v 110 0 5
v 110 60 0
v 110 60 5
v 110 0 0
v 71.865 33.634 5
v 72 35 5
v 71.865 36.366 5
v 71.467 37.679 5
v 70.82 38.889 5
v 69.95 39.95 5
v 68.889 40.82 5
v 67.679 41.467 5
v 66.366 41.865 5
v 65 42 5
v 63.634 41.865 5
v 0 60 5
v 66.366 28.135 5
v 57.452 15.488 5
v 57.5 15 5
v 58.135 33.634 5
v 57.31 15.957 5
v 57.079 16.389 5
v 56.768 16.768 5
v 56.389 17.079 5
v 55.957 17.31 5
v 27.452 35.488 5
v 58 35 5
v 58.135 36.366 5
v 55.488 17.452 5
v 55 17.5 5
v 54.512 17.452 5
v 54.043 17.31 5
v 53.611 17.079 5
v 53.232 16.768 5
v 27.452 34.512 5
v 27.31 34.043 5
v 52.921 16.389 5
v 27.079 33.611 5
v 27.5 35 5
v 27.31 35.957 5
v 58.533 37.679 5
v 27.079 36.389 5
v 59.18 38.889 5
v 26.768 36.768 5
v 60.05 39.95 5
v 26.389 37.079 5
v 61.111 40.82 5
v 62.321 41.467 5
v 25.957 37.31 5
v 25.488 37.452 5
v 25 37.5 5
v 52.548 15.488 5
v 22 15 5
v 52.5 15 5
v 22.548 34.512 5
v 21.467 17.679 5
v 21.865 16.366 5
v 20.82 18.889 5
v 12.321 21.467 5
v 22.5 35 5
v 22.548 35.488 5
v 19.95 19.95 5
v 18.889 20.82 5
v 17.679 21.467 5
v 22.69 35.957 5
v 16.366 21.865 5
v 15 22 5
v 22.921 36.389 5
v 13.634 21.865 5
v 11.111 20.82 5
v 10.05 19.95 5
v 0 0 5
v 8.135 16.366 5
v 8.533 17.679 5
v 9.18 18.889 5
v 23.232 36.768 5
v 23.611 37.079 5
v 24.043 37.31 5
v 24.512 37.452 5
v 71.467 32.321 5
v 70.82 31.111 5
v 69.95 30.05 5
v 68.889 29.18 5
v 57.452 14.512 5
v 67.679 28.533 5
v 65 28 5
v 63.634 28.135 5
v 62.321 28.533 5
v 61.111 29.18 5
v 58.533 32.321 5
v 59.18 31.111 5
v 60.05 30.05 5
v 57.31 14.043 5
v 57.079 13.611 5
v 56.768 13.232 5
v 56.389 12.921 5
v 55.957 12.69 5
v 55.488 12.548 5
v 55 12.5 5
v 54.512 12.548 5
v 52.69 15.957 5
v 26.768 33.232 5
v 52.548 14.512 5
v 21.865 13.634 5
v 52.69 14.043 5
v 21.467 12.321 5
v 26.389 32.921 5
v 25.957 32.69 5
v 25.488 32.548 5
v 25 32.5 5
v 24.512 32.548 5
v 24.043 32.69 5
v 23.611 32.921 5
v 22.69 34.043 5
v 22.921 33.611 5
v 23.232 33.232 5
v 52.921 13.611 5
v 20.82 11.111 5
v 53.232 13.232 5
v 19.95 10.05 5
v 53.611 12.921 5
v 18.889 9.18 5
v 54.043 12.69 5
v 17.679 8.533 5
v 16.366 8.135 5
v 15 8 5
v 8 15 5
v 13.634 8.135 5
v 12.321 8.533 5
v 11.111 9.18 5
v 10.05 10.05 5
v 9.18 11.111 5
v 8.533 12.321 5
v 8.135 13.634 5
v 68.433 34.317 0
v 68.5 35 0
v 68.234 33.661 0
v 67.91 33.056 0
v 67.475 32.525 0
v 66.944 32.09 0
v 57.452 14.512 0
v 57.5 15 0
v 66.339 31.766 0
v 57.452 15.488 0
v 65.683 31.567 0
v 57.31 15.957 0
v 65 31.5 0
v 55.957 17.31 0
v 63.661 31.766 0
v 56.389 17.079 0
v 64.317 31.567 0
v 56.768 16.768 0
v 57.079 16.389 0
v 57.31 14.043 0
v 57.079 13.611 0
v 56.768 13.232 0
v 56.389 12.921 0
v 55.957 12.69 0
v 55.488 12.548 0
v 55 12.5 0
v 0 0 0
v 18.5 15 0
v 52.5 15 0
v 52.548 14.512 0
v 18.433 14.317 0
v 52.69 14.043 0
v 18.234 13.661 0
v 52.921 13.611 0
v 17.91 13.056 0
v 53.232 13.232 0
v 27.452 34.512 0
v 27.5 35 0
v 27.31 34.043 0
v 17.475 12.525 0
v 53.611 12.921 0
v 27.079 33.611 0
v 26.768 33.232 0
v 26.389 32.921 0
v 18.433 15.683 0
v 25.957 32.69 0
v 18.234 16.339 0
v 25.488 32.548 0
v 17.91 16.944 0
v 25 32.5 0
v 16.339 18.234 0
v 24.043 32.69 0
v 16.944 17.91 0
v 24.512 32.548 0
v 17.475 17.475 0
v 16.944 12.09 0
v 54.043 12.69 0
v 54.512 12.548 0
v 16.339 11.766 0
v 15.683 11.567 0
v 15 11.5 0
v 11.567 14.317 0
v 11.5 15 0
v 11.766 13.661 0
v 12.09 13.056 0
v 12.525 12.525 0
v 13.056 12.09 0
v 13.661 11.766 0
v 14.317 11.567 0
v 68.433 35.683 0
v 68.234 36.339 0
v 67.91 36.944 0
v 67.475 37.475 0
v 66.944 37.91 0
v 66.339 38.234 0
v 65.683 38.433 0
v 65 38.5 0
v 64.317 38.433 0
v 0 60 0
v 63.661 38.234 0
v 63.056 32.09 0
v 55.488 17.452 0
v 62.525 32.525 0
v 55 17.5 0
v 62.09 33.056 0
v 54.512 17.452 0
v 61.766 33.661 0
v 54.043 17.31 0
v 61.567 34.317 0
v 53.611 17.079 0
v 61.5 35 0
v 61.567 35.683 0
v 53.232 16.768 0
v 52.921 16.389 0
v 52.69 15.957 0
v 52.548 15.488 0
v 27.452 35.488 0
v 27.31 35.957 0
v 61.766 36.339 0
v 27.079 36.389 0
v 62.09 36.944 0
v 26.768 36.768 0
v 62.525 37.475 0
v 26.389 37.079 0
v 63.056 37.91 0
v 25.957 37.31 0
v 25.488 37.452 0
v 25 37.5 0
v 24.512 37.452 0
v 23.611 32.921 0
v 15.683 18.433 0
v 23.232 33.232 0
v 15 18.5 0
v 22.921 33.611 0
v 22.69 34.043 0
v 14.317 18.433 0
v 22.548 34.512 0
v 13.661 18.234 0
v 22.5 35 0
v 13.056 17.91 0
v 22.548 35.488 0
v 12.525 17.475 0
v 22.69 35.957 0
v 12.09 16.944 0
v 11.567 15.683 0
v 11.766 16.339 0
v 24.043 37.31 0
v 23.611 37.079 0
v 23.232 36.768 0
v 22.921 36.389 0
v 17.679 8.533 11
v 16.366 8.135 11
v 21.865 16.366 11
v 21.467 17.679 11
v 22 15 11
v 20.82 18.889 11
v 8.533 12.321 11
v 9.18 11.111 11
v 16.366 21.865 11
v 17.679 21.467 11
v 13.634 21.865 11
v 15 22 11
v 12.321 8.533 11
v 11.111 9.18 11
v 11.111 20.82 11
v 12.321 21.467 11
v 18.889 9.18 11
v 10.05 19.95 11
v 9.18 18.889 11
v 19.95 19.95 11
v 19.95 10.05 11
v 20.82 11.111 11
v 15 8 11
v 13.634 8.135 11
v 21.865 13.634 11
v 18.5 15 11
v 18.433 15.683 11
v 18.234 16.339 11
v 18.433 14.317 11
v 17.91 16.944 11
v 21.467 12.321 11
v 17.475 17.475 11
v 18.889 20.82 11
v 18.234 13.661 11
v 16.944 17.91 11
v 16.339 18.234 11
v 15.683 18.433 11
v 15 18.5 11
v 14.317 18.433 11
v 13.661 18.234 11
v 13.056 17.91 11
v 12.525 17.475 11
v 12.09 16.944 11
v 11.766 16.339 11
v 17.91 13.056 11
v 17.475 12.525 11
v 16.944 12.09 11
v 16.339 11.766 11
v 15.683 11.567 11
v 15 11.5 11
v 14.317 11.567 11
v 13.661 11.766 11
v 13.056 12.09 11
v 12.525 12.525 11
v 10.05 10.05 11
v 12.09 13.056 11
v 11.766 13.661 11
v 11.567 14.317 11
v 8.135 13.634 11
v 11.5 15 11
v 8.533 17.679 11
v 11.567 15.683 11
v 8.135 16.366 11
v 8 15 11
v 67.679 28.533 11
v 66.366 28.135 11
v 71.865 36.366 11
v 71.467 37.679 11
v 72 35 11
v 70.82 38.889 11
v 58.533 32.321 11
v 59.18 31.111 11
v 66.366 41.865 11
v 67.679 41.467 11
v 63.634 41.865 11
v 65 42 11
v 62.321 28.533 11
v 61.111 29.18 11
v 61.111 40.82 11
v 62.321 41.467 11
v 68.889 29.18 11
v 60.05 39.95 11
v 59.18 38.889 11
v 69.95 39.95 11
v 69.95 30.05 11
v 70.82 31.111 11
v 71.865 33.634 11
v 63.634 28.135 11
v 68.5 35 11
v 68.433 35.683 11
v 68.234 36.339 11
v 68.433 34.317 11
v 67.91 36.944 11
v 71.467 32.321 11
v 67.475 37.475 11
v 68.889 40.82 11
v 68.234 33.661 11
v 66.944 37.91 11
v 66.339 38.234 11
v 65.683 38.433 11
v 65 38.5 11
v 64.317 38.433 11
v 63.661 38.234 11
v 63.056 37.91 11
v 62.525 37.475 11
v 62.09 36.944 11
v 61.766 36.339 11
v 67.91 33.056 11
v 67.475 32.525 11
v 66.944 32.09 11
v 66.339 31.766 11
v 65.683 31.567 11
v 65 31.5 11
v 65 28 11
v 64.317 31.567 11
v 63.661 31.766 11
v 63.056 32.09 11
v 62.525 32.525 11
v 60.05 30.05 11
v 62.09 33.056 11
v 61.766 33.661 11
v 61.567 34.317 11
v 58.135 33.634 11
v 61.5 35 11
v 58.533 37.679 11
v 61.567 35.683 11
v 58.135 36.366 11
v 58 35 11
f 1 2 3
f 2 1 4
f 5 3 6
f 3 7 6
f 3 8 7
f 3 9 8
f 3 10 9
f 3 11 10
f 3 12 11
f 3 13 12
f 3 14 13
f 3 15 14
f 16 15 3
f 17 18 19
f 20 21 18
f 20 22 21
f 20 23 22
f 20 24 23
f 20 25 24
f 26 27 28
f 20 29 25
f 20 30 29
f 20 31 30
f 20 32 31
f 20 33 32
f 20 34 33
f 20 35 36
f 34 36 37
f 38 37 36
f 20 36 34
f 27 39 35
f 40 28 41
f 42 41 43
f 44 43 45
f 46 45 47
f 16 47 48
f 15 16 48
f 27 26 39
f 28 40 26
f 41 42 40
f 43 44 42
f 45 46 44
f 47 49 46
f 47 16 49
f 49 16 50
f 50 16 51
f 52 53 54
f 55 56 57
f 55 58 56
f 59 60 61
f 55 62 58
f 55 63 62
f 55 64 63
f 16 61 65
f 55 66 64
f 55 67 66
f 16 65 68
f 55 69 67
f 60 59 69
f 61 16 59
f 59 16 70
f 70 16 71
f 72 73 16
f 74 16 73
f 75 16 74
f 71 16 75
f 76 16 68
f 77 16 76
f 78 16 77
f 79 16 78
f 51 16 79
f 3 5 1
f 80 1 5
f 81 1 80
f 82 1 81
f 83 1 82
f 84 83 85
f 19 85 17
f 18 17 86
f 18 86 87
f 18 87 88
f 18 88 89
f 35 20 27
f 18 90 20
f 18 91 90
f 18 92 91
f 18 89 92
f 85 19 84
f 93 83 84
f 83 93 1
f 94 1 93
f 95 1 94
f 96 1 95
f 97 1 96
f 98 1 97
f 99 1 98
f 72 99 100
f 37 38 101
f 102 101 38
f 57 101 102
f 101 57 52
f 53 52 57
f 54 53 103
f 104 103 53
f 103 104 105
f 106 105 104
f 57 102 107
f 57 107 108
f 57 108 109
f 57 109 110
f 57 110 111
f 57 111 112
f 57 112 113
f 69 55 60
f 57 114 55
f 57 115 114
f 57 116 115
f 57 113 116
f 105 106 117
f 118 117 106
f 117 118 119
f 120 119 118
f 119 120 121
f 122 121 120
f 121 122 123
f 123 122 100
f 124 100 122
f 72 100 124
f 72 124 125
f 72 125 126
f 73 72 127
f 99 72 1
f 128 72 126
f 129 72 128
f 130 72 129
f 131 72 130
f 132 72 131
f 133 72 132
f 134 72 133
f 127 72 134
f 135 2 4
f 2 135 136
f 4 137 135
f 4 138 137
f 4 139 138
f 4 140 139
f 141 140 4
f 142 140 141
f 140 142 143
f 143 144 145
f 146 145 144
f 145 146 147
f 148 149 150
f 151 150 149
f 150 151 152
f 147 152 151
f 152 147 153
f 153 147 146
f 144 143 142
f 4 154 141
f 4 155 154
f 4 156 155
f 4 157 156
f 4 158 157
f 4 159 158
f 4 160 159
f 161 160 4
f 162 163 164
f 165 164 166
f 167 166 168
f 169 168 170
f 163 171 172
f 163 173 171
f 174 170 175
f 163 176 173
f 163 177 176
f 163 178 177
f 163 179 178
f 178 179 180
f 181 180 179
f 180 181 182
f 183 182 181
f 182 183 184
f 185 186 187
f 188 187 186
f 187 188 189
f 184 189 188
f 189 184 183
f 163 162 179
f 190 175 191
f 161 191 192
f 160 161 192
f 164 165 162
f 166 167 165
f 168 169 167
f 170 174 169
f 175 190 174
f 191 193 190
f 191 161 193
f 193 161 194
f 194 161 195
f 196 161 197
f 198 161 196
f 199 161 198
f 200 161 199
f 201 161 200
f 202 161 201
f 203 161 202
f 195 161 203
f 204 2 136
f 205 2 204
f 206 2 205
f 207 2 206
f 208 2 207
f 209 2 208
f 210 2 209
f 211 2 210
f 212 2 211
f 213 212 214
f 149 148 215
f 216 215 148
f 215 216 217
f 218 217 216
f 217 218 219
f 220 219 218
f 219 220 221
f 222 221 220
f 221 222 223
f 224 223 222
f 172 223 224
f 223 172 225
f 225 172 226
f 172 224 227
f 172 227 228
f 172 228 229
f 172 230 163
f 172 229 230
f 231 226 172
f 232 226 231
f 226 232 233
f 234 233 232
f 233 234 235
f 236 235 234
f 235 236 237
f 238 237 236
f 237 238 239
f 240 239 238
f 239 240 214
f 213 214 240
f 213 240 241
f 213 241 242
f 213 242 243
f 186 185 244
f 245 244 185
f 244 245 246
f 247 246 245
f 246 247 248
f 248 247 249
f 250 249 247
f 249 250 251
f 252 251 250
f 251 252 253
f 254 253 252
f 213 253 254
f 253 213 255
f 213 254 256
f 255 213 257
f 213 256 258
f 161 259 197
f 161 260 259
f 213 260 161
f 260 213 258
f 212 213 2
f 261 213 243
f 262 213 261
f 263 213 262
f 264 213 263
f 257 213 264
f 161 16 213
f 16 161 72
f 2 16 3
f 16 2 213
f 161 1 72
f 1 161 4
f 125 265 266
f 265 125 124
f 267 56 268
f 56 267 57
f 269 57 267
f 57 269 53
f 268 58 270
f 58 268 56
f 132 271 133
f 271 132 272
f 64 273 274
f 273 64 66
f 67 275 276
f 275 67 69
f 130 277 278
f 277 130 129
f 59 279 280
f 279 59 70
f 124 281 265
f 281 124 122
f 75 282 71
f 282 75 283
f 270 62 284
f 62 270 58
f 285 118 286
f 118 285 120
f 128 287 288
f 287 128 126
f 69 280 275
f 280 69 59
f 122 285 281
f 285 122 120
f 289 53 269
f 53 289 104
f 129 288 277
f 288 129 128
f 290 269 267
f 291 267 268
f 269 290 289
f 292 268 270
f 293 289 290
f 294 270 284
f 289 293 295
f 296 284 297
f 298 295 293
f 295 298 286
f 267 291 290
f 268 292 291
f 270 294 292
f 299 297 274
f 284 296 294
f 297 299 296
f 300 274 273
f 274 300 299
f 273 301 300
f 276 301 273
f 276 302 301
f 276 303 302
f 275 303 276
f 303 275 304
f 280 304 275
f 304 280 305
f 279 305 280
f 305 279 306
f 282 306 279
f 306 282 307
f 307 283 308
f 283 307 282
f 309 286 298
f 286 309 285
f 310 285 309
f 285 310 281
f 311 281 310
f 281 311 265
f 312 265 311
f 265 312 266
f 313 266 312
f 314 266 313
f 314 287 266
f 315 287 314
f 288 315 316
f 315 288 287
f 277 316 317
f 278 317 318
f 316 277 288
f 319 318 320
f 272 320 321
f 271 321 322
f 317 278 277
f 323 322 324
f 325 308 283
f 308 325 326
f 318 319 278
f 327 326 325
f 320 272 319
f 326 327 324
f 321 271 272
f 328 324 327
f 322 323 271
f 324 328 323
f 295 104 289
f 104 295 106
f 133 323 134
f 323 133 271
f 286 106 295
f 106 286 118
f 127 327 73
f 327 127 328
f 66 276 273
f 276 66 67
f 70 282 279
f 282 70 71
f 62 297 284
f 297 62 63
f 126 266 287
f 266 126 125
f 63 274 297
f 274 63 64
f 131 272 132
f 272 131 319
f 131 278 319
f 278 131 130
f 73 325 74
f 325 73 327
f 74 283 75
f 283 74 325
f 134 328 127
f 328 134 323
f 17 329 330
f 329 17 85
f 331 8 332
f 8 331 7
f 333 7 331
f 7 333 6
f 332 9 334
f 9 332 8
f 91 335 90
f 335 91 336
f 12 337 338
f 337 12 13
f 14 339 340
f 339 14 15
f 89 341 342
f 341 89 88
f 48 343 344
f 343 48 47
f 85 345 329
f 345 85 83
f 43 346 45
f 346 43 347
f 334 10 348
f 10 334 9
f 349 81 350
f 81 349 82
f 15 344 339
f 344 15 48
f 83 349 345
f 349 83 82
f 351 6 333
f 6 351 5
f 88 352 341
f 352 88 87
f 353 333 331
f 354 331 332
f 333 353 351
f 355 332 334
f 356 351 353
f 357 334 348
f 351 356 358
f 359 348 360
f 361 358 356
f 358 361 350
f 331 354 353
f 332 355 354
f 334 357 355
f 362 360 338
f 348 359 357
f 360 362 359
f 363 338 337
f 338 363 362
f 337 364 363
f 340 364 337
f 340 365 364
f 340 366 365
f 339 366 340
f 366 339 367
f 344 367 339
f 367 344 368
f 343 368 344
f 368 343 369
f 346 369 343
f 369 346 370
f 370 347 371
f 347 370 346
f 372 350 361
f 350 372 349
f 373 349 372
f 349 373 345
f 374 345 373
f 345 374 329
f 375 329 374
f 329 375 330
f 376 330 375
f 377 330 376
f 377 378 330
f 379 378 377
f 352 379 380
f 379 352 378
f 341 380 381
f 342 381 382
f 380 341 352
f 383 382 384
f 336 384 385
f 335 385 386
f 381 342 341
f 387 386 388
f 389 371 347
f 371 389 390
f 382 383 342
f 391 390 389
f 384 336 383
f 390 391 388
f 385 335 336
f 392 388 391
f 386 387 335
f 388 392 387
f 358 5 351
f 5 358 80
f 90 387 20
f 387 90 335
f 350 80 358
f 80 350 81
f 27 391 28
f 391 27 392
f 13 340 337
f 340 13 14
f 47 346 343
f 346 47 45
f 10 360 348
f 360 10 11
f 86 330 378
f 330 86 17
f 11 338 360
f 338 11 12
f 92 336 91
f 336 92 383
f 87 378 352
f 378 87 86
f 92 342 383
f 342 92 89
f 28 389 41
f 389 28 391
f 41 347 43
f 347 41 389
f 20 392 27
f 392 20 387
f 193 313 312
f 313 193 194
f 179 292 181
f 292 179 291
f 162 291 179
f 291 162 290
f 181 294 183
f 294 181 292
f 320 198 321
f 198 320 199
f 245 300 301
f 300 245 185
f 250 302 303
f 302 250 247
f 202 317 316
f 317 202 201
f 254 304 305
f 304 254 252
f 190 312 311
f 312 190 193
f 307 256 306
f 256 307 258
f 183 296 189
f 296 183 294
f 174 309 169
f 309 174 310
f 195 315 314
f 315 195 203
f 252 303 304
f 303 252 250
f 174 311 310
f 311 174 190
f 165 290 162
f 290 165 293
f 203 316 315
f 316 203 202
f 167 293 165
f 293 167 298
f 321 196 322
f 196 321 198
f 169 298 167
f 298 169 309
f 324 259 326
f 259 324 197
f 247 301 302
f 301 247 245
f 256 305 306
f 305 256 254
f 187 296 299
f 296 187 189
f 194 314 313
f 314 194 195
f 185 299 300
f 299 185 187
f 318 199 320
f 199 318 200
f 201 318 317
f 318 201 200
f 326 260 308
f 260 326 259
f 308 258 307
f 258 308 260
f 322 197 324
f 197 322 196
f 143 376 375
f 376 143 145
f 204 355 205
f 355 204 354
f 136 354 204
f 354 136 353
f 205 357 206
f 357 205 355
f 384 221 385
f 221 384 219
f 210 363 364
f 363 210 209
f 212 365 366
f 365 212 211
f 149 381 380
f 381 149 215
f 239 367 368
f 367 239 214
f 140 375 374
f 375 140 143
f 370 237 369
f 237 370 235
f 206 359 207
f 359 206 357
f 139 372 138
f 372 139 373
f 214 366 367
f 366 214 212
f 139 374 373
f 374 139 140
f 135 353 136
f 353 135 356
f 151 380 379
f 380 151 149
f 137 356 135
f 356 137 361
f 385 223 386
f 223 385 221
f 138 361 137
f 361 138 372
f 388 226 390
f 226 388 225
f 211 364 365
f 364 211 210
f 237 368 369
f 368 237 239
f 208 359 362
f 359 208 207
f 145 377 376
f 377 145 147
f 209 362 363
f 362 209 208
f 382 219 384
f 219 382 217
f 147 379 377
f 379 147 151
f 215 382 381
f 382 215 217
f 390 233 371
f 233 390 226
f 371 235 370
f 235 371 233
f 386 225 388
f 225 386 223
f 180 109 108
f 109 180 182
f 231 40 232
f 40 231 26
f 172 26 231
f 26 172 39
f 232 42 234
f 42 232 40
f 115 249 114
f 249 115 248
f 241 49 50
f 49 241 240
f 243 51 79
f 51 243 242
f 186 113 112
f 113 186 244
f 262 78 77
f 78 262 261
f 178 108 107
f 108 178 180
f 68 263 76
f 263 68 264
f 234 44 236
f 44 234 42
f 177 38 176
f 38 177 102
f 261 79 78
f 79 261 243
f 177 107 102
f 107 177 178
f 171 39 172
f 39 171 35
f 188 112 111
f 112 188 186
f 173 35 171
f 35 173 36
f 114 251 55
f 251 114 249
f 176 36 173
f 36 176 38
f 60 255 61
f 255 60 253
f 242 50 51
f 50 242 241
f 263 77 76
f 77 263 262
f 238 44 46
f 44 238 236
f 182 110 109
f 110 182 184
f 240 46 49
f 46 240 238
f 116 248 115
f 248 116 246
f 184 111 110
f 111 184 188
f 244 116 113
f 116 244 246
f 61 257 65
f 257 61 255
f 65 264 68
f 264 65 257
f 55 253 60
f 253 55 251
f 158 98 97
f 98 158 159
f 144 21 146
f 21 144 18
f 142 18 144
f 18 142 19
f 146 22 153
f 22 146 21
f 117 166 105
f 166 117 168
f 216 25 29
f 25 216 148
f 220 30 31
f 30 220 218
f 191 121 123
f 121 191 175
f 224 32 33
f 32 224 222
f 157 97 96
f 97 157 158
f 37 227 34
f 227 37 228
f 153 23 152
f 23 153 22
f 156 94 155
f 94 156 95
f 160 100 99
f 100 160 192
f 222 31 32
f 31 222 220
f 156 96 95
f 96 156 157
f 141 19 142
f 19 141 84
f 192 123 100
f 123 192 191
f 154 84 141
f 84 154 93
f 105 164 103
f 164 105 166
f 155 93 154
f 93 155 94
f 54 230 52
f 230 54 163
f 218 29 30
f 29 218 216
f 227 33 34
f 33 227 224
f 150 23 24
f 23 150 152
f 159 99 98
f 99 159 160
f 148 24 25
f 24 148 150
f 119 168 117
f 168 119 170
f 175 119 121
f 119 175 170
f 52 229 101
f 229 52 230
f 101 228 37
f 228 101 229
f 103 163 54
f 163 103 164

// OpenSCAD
$fn = 32;

// ----------------------------------------------------------------------
// Mixed field: bosses and holes at given coordinates
// ----------------------------------------------------------------------

// --- parameters (mm) ---
plate_l = 110;            // plate length, X
plate_w = 60;             // plate width, Y
plate_t = 5;              // plate thickness, Z
boss_d = 14;              // boss diameter
boss_h = 6;               // boss height above the plate
hole_d = 5;               // through hole diameter

total_h = plate_t + boss_h;  // overall height

difference() {
  union() {
    cube([plate_l, plate_w, plate_t]);
    translate([15, 15, plate_t]) cylinder(h = boss_h, d = boss_d);
    translate([65, 35, plate_t]) cylinder(h = boss_h, d = boss_d);
  }
  translate([15, 15, -1]) cylinder(h = total_h + 2, d = boss_d / 2);
  translate([65, 35, -1]) cylinder(h = total_h + 2, d = boss_d / 2);
  translate([25, 35, -1]) cylinder(h = plate_t + 2, d = hole_d);
  translate([55, 15, -1]) cylinder(h = plate_t + 2, d = hole_d);
}
